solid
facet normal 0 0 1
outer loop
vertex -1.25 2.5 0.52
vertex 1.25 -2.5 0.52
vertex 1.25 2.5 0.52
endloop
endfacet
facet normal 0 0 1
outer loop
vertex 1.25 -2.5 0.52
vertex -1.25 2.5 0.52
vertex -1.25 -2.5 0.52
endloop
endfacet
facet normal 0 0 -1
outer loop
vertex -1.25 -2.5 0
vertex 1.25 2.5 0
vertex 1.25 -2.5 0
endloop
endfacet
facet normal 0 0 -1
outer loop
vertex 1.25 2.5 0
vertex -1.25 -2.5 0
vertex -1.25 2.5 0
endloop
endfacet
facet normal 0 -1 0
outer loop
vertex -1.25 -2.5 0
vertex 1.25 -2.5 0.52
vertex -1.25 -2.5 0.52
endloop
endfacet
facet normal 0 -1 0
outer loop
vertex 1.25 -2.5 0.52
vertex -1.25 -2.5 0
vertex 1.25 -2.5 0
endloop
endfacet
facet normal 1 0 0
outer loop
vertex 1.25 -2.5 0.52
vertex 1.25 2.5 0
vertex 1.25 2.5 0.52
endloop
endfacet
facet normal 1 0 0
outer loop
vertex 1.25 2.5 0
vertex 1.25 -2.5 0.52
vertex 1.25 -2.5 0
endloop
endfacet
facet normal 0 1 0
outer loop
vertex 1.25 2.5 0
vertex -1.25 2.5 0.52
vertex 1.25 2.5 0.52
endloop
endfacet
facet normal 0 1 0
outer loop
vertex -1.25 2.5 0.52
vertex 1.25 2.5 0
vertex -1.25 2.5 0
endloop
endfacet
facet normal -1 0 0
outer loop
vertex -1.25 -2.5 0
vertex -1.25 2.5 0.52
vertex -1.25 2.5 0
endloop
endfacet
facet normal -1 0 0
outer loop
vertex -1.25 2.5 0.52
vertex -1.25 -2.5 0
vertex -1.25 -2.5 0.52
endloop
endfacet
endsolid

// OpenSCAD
/*
 * Create a 2010 size case
 *
 * Author: Ian McInerney
 * Created: March 19, 2015
 */

// The case
translate([0,0,0.52/2]) {
	cube(size=[2.5,5.0,0.52], center=true);
}
